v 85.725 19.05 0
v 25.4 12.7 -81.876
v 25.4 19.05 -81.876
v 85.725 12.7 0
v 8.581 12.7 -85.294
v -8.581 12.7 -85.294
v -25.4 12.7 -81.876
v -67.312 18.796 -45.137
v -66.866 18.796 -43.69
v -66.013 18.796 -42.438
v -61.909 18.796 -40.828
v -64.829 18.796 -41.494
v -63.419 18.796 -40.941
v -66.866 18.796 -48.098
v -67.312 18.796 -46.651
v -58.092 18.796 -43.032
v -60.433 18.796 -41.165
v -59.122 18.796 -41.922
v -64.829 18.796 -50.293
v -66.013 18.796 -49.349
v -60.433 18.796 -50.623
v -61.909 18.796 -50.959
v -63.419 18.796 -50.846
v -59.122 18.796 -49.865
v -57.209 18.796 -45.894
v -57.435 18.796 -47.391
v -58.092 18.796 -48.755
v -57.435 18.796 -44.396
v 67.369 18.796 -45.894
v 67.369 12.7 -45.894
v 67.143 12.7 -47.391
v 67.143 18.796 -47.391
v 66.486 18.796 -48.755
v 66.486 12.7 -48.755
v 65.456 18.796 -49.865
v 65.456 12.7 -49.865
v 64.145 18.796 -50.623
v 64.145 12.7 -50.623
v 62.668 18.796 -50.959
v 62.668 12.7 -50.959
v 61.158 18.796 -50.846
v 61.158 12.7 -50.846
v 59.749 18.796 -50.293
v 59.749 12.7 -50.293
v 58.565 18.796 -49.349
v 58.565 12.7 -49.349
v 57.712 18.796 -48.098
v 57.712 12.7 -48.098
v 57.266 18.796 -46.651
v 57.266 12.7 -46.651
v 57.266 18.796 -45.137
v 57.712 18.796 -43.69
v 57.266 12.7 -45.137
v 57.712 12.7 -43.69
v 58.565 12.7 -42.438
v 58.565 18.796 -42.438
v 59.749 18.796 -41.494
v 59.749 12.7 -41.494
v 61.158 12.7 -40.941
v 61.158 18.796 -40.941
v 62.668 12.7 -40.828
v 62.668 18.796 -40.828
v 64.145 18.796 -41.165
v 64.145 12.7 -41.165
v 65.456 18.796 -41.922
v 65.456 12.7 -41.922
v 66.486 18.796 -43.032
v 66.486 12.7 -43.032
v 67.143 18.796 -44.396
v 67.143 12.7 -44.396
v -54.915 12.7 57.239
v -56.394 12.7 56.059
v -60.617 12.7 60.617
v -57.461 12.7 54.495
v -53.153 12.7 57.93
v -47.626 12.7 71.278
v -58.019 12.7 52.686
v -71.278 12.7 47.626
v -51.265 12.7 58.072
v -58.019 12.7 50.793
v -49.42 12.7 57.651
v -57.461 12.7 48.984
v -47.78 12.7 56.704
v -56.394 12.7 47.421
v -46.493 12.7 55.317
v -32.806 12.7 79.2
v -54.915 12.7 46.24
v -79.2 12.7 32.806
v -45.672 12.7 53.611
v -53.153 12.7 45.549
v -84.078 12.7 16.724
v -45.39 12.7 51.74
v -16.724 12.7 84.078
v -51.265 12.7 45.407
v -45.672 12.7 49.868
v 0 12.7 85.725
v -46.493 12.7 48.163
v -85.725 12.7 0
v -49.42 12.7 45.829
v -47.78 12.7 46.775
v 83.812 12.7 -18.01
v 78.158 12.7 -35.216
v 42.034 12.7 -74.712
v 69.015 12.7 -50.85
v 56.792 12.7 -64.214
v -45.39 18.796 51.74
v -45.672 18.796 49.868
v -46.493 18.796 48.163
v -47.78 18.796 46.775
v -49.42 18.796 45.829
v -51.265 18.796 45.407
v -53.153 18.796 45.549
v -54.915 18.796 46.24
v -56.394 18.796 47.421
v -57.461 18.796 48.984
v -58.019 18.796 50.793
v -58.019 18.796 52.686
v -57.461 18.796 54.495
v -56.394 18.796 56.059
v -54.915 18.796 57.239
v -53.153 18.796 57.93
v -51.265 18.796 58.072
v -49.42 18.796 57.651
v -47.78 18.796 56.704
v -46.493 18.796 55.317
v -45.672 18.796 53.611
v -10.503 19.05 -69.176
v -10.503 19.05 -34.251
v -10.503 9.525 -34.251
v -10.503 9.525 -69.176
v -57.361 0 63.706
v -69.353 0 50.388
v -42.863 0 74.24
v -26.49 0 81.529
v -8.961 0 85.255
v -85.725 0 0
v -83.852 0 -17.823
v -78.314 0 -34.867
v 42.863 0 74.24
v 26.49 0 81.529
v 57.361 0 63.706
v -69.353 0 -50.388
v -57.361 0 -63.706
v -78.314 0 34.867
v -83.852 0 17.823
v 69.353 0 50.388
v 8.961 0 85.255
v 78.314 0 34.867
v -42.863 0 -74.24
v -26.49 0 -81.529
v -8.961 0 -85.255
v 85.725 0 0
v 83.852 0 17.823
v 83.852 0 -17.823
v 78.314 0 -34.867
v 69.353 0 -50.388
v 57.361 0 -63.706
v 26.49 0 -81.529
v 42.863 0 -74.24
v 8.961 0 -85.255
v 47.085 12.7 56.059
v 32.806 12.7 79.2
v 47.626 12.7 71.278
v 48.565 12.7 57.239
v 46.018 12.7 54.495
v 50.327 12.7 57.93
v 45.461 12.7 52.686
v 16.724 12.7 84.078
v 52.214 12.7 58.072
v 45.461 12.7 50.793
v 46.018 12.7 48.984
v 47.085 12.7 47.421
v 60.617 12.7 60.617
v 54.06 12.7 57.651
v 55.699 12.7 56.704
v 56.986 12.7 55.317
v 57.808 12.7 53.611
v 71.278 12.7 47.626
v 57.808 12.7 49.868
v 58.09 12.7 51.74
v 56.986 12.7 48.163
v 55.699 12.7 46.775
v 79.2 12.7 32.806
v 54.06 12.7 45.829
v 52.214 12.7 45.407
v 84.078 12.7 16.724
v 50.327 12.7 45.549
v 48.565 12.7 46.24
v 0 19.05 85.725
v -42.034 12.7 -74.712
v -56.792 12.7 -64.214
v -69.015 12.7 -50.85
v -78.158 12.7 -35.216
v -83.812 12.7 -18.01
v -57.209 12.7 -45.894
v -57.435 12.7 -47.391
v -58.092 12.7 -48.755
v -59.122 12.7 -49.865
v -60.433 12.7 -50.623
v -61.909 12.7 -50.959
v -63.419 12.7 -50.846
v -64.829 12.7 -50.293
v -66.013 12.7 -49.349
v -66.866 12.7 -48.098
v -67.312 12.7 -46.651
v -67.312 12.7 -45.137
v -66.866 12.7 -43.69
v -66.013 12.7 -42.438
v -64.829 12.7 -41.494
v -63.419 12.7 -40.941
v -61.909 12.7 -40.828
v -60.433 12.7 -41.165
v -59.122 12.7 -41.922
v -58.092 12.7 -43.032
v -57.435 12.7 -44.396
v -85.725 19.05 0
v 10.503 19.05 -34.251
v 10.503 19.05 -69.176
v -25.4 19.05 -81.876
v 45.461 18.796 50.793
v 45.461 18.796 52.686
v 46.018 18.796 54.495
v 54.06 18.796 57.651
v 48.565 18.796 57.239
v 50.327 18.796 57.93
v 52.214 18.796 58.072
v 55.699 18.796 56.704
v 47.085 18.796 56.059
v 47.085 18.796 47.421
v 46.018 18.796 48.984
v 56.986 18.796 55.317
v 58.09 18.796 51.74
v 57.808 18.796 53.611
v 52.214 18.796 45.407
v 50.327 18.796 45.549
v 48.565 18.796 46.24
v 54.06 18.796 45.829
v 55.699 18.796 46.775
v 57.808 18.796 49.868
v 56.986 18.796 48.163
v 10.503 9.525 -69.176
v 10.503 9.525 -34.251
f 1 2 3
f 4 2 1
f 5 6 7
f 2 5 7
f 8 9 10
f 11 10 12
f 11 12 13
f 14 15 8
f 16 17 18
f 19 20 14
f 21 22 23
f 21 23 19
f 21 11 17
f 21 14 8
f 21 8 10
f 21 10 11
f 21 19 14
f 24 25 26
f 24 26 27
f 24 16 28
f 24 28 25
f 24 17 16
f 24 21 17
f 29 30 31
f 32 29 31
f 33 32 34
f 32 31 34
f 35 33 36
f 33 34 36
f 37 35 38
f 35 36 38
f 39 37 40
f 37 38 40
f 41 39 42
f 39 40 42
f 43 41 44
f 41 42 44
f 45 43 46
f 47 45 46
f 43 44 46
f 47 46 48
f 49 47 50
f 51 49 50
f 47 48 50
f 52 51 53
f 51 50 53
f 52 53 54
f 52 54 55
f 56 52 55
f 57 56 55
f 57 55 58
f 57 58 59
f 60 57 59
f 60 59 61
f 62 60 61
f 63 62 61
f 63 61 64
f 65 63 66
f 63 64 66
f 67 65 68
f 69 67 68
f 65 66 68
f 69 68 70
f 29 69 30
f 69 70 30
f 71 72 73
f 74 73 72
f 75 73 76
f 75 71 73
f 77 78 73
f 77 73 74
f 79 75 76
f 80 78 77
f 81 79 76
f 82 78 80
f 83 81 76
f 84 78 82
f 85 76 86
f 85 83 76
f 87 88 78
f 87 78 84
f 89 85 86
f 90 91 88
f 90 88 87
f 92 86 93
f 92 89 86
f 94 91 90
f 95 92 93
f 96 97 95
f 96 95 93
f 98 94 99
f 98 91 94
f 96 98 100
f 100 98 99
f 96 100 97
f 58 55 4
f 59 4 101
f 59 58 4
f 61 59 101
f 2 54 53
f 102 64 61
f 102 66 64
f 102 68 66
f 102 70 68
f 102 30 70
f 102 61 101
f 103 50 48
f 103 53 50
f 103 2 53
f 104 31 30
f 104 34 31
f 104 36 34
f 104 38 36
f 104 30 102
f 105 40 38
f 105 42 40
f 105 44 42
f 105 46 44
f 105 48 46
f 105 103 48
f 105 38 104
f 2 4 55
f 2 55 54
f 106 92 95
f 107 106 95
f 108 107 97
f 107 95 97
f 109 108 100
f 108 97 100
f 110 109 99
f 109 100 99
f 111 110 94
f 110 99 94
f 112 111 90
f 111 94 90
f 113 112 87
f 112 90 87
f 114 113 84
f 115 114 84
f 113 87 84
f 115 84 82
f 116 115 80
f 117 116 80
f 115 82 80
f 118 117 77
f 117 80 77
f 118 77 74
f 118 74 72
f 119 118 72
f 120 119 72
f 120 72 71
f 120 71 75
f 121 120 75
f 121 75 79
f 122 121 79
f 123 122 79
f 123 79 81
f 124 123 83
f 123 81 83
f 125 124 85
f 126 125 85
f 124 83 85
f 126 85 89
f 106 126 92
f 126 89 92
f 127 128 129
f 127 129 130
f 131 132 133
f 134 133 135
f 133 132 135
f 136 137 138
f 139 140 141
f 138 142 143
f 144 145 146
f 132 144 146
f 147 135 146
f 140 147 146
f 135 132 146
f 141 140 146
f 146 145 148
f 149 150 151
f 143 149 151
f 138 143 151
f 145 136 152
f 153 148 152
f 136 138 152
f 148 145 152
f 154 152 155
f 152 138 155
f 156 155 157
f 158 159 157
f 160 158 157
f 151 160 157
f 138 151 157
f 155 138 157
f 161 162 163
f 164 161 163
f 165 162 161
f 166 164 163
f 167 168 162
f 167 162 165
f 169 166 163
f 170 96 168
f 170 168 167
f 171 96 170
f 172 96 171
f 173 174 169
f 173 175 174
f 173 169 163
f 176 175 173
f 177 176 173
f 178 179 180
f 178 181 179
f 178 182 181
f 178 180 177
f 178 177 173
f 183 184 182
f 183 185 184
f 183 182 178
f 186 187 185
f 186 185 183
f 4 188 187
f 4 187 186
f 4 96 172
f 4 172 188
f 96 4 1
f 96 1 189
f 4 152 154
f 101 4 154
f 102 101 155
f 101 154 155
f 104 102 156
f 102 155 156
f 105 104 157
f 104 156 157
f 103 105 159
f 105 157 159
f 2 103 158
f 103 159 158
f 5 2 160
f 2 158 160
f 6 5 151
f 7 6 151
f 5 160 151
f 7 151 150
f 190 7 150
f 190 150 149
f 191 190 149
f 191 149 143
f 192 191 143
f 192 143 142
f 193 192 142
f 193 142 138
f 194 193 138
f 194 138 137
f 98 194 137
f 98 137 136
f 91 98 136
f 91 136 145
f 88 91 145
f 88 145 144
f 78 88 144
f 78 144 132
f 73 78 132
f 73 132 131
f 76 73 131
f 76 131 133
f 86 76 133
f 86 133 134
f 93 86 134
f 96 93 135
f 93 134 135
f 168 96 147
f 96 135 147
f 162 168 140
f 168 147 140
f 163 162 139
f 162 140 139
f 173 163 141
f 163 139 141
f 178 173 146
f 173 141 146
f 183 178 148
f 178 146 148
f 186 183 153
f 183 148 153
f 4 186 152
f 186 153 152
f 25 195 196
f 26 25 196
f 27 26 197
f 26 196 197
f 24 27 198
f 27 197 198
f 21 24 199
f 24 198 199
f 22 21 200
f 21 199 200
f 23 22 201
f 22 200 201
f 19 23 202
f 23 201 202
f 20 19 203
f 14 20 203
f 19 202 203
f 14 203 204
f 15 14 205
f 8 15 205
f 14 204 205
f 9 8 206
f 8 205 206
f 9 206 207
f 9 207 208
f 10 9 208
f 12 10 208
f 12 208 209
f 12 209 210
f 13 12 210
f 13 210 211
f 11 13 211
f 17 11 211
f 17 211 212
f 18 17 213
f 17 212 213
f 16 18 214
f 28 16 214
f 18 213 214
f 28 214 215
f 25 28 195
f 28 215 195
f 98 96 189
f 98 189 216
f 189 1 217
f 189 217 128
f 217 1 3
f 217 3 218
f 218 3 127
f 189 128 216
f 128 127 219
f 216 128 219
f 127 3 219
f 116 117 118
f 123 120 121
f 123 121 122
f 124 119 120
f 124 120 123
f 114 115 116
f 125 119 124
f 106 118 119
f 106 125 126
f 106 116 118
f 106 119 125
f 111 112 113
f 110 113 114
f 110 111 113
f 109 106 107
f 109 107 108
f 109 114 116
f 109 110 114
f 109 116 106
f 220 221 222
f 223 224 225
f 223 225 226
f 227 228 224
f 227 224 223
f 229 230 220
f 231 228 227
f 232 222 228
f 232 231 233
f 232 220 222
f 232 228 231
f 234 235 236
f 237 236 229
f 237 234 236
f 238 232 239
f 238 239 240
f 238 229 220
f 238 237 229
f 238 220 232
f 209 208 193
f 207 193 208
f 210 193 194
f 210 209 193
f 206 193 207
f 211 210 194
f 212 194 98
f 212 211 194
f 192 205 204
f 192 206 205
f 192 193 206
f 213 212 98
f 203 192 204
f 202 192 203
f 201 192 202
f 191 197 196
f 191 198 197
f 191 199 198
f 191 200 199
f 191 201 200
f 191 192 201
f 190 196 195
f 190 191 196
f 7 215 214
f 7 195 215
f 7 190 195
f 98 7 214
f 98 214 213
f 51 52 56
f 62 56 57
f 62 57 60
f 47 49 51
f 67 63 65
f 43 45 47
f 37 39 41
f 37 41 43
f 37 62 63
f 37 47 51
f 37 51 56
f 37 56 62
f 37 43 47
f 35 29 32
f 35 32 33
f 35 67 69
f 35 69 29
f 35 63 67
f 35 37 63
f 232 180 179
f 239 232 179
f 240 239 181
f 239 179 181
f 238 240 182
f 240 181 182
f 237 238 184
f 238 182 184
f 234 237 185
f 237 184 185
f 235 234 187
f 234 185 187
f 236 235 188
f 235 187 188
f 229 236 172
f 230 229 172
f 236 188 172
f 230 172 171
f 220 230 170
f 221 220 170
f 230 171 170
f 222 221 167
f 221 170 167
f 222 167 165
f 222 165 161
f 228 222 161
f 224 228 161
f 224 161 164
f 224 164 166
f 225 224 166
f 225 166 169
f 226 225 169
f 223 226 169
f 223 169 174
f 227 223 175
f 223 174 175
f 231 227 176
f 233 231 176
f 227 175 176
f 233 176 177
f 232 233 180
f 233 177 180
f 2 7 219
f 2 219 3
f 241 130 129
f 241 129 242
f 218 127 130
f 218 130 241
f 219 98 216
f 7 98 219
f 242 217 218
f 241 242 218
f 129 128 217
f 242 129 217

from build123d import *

# Parameters (mm, degrees)
SKETCH1_R           = 85.725
BOSS_EXTRUDE1_DEPTH = 12.7
BOSS_EXTRUDE2_DEPTH = 6.35
SKETCH3_R           = 6.35
SKETCH3_R_2         = 5.08
BOSS_EXTRUDE3_DEPTH = 6.096
SKETCH4_W           = 21.0058
SKETCH4_H           = 34.925
CUT_EXTRUDE1_DEPTH  = 9.525


with BuildPart() as part:
    # Sketch1 → Boss-Extrude1 (new body)
    with BuildSketch(Plane(origin=(0, 0, 0), x_dir=(1, 0, 0), z_dir=(0, 1, 0))):
        Circle(SKETCH1_R)
    extrude(amount=BOSS_EXTRUDE1_DEPTH)

    # Sketch2 → Boss-Extrude2 (add)
    with BuildSketch(Plane(origin=(0, 12.7, 0), x_dir=(1, 0, 0), z_dir=(0, 1, 0))):
        Polygon((-25.4, 81.875610685), (25.4, 81.875610685), (85.725, 0), (0, -85.725), (-85.725, 0), align=None)
    extrude(amount=BOSS_EXTRUDE2_DEPTH)

    # Sketch3 → Boss-Extrude3 (add)
    with BuildSketch(Plane(origin=(0, 12.7, 0), x_dir=(1, 0, 0), z_dir=(0, 1, 0))):
        with Locations((-51.739614409, -51.739614409)):
            Circle(SKETCH3_R)
        with Locations((51.739614409, -51.739614409)):
            Circle(SKETCH3_R)
        with Locations((62.288840877, 45.893695259)):
            Circle(SKETCH3_R_2)
        with Locations((-62.288840877, 45.893695259)):
            Circle(SKETCH3_R_2)
    extrude(amount=BOSS_EXTRUDE3_DEPTH)

    # Sketch4 → Cut-Extrude1 (cut)
    with BuildSketch(Plane(origin=(0, 19.05, 0), x_dir=(1, 0, 0), z_dir=(0, 1, 0))):
        with Locations((0, 51.713110685)):
            Rectangle(SKETCH4_W, SKETCH4_H)
    extrude(amount=-CUT_EXTRUDE1_DEPTH, mode=Mode.SUBTRACT)


solid = part.part
